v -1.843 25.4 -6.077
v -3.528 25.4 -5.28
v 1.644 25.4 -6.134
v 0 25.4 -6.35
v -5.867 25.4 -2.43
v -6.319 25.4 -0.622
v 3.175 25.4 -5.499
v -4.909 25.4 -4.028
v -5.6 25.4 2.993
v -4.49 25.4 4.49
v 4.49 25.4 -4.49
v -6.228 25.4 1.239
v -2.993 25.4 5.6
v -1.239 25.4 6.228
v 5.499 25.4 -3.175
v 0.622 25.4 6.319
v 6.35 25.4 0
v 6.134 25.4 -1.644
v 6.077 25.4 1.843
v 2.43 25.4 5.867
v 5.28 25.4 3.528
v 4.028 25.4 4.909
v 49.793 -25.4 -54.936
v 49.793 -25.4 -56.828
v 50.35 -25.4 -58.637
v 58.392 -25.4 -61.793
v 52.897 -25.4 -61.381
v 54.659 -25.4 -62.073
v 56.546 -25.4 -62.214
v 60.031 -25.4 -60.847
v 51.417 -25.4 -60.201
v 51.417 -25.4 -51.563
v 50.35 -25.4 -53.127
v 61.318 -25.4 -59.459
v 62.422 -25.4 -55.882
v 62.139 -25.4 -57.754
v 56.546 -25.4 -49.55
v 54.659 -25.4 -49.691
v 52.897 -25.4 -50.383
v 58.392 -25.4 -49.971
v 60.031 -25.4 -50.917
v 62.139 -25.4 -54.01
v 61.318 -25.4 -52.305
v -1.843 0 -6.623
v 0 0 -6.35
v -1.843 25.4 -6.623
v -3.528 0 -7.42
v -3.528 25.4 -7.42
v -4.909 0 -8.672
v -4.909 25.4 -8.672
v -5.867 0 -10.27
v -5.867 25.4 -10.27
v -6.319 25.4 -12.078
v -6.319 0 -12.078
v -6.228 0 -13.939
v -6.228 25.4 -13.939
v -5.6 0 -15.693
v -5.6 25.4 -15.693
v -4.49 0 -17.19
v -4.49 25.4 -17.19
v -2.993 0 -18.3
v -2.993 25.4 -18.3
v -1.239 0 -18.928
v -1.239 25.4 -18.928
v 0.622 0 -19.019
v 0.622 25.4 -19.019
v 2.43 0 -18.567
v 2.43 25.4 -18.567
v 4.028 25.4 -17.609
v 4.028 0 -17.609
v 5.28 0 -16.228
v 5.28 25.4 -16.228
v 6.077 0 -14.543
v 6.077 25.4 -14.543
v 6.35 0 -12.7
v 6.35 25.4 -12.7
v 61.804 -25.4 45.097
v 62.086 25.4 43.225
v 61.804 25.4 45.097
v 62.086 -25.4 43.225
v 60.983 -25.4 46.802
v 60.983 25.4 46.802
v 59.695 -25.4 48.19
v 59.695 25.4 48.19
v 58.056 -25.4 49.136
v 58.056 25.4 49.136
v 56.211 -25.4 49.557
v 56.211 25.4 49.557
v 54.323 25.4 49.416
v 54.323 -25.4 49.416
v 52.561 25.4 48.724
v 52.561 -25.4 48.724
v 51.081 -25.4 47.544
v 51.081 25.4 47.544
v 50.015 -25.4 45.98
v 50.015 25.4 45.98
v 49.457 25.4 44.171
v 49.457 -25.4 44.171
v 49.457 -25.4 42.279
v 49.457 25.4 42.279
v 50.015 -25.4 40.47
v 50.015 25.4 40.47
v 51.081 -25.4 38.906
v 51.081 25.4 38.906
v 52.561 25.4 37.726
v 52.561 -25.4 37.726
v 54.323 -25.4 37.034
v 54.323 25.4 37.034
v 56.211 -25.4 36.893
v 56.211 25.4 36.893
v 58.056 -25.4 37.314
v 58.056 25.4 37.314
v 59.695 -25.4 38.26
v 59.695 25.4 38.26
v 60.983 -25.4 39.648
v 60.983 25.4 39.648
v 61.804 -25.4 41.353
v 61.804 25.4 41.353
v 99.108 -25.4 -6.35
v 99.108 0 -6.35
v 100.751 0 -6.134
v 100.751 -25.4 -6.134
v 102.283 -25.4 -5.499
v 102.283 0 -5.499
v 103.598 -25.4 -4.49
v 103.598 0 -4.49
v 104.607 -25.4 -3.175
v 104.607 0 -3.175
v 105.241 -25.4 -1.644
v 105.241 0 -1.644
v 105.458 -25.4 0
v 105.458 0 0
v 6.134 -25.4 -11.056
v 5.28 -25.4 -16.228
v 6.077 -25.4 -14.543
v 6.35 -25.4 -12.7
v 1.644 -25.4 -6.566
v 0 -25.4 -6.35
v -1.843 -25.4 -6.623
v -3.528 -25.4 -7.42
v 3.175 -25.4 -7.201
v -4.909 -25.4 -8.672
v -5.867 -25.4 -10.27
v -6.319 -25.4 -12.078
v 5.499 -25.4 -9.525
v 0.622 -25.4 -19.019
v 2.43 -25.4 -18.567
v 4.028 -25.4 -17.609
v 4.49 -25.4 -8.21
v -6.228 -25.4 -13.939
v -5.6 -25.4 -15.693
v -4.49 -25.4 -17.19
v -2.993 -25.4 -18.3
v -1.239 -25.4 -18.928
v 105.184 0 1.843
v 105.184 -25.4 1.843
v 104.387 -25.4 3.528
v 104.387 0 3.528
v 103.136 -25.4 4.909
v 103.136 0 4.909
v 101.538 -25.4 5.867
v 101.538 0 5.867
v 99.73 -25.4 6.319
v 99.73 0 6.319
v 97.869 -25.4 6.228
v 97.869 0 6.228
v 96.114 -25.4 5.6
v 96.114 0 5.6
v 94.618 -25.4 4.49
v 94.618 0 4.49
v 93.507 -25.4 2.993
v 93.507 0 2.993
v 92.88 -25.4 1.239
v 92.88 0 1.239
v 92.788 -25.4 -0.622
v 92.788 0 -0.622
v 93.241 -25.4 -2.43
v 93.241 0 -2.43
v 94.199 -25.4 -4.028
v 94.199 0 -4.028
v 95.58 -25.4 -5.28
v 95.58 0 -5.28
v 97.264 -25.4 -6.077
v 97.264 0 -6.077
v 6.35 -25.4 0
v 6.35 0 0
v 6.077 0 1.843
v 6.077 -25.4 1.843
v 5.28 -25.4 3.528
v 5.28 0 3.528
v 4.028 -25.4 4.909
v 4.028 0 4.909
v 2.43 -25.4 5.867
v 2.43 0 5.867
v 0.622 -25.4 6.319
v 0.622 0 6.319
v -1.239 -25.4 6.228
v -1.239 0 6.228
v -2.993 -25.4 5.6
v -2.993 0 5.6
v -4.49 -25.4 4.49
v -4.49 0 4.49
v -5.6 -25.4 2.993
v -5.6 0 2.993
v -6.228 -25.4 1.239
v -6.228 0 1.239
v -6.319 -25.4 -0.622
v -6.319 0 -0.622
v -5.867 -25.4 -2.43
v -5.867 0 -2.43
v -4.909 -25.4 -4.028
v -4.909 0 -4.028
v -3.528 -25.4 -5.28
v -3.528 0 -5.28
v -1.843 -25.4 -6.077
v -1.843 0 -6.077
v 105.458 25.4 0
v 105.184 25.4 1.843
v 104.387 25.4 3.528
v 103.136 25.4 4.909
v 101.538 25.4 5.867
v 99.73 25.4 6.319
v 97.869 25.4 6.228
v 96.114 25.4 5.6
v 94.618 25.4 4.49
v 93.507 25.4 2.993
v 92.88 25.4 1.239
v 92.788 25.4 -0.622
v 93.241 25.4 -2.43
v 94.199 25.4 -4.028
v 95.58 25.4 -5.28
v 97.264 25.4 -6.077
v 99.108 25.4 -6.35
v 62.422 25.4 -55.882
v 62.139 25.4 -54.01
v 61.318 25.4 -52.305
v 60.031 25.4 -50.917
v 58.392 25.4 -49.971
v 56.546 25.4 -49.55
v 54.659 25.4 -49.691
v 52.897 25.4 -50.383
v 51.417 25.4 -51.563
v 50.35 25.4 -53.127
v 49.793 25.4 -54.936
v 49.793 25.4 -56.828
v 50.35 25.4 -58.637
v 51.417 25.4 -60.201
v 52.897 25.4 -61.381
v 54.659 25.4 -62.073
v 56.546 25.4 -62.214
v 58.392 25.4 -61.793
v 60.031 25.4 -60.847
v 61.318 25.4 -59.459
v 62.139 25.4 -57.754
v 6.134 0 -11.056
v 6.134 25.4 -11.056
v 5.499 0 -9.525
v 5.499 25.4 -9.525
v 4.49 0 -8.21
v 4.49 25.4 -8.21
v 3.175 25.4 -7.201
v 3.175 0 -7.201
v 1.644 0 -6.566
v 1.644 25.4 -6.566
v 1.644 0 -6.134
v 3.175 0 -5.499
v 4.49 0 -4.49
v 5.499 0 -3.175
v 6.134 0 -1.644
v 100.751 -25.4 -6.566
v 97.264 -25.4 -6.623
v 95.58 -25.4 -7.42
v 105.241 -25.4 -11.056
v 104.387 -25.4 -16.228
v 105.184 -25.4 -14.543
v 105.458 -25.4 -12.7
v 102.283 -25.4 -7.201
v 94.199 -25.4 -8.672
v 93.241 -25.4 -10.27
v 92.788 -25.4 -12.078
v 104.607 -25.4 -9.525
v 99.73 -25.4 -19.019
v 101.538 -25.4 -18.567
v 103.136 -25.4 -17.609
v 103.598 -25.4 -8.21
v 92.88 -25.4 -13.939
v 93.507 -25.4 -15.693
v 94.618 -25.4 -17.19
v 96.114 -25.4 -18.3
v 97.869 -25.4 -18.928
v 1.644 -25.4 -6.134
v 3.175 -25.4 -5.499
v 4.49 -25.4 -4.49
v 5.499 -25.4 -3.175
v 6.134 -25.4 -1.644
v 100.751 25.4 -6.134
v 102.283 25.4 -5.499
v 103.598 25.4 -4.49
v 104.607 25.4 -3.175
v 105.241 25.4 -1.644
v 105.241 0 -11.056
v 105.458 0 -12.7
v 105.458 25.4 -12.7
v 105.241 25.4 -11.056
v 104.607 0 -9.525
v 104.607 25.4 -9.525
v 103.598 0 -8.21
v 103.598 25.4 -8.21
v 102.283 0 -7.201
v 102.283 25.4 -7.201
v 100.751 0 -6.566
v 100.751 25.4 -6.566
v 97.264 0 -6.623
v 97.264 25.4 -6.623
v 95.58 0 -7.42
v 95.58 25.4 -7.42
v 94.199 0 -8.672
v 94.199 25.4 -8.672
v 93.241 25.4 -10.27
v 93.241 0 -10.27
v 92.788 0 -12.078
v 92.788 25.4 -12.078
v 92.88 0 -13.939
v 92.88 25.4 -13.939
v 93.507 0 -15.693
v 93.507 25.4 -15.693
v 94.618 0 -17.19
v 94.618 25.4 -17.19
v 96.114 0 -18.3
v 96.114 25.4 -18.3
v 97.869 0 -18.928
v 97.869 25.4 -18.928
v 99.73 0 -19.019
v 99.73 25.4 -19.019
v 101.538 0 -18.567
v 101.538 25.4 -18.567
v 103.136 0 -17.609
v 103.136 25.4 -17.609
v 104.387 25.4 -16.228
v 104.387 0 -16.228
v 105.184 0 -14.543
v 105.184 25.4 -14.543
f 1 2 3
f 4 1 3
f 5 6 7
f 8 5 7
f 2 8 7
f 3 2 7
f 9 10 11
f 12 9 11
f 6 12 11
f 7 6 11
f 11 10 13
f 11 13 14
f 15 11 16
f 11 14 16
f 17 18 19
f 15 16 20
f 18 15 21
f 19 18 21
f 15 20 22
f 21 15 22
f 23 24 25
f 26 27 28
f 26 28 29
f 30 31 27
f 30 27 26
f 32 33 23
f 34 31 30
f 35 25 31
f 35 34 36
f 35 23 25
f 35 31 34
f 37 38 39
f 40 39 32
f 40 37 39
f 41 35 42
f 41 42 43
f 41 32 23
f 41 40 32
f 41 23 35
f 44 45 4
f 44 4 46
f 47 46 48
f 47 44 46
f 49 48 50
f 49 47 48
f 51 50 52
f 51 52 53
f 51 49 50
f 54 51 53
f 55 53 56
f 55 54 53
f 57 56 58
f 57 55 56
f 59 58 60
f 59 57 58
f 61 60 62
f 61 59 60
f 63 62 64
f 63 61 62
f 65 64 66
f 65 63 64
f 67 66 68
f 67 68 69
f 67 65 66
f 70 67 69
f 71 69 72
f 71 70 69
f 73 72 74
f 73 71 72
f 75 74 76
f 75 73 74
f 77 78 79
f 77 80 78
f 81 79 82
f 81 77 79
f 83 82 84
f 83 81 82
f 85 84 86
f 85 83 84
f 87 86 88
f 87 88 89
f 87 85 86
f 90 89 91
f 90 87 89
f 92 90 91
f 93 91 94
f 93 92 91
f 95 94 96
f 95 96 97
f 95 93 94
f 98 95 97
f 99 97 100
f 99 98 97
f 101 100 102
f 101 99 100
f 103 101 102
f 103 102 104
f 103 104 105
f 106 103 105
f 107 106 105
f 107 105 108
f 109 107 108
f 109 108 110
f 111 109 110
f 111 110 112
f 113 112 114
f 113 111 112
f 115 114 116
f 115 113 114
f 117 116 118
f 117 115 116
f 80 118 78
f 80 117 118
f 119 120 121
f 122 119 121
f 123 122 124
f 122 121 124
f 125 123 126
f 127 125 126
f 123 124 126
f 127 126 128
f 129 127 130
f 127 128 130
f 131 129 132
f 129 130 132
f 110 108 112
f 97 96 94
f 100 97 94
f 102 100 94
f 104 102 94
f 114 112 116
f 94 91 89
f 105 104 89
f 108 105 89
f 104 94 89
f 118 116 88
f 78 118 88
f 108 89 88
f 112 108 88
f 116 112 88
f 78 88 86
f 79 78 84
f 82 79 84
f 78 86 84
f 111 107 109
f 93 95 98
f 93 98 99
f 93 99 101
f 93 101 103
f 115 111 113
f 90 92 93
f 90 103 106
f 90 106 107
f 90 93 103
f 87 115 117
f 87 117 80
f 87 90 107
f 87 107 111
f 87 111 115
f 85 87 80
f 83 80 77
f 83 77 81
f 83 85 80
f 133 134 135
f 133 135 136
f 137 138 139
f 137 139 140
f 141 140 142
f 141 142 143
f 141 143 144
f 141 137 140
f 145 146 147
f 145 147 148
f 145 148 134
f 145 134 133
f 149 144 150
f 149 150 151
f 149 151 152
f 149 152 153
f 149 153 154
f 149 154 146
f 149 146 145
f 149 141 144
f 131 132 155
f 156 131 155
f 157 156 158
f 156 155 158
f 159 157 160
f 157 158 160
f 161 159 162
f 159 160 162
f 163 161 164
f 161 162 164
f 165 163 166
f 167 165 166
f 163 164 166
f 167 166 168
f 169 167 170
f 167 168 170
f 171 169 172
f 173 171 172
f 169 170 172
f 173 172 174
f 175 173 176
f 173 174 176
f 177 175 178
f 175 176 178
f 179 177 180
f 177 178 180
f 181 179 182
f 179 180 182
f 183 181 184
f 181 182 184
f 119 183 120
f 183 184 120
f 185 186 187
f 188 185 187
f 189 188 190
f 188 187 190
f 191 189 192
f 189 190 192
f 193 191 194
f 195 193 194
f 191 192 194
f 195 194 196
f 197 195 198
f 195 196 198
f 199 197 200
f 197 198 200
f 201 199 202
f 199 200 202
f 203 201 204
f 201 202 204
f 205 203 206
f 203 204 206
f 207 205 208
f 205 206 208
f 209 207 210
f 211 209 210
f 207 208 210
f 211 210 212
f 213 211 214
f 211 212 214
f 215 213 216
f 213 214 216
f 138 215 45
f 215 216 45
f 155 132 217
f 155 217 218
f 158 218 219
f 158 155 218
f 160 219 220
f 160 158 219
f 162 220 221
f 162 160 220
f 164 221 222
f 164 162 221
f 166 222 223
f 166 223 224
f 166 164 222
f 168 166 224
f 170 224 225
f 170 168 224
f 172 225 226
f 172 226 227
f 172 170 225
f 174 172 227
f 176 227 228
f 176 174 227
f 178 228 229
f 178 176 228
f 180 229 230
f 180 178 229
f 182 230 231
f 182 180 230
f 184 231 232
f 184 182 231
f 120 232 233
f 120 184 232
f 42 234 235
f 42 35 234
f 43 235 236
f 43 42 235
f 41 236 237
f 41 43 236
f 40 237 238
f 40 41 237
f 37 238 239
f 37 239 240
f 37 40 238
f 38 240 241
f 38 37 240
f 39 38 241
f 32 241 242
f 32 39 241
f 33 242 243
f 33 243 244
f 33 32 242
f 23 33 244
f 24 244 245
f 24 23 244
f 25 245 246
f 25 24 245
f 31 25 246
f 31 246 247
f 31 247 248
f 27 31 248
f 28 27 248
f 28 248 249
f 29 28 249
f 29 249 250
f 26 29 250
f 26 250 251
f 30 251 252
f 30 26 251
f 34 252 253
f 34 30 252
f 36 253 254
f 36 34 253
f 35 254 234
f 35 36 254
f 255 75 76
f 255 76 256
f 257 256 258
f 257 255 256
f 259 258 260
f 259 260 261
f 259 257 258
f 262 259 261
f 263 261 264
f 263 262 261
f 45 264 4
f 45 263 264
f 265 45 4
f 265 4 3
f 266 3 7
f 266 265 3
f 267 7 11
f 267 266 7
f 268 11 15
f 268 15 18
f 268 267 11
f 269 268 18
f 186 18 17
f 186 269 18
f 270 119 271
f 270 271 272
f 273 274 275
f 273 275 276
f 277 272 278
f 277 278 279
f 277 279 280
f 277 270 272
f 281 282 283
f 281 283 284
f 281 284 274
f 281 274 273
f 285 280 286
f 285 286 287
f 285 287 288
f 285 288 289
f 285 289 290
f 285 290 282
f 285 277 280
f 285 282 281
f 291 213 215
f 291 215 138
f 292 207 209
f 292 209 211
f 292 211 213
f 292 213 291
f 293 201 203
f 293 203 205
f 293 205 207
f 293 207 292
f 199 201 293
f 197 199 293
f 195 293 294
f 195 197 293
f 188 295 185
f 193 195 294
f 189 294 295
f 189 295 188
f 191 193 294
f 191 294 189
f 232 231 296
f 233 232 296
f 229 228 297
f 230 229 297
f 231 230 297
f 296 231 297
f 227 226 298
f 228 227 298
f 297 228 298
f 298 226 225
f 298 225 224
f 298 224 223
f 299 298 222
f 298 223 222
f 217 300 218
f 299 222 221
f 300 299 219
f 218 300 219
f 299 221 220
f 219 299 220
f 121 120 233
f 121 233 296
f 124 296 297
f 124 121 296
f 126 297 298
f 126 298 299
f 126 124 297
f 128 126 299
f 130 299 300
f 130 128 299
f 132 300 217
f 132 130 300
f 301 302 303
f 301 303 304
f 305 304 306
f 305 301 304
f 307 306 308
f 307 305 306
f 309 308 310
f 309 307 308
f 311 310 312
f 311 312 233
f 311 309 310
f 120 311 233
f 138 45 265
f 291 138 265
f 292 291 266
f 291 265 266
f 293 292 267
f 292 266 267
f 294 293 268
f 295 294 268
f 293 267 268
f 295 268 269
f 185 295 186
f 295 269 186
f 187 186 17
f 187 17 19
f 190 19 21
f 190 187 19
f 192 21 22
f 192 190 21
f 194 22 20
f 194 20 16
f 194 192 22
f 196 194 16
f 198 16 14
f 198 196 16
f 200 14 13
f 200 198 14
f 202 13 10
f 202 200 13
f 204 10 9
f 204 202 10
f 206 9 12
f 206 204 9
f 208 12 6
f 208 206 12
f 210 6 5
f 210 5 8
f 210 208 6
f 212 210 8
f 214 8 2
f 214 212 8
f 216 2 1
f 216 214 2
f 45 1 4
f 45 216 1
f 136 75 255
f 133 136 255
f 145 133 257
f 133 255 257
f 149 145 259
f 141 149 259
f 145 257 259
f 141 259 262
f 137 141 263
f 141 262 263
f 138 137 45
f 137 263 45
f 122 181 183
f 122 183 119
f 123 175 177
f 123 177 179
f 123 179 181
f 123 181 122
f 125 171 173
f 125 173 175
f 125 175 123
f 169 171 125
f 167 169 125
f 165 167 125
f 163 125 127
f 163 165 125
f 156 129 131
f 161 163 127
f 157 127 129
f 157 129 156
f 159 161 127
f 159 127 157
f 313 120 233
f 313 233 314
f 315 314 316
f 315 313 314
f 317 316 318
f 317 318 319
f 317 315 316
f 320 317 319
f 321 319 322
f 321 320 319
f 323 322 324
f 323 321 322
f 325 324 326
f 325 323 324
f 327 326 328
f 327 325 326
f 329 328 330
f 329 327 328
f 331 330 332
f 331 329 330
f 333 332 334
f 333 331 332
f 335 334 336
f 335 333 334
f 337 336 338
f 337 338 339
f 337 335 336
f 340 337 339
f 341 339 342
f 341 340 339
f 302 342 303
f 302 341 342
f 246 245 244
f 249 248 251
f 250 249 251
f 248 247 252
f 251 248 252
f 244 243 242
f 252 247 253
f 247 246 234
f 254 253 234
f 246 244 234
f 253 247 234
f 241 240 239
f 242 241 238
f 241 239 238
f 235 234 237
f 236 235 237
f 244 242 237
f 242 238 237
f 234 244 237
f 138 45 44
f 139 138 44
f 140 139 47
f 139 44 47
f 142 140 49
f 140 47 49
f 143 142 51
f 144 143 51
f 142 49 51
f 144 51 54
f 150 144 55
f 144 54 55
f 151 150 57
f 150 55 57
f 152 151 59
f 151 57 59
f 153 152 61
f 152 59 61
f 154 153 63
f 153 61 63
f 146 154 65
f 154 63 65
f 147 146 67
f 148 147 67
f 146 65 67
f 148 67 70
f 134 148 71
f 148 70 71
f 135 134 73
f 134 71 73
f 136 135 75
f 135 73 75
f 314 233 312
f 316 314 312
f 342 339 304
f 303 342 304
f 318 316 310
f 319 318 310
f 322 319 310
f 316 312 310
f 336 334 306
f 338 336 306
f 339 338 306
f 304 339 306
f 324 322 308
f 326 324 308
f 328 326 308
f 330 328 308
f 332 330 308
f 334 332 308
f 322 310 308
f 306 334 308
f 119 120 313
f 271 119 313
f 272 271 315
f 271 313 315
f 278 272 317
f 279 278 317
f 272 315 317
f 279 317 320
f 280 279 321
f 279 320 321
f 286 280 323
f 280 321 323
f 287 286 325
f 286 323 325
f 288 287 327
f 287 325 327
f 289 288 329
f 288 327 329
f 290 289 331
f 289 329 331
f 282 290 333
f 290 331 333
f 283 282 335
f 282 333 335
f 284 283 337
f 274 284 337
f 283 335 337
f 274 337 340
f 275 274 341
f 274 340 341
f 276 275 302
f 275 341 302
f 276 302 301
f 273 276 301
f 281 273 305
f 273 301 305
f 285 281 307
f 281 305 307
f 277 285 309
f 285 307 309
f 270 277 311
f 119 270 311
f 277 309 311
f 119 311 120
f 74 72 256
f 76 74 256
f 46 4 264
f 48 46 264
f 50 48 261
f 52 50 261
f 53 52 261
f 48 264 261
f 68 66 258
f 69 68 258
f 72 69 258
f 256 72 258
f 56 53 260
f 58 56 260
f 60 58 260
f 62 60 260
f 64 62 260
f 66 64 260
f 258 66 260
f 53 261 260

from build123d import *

# Parameters (mm, degrees)
F1_DEPTH = 25.4
F0_R     = 6.35


with BuildPart() as f1:
    # F0 (on Front) → F1 (new body, symmetric)
    with BuildSketch(Plane.XZ):
        with BuildLine():
            ThreePointArc((0, -6.35), (4.4901280605, -4.4901280605), (6.35, 0))
            ThreePointArc((6.35, 0), (-4.4901280605, 4.4901280605), (0, -6.35))
        make_face()
    extrude(amount=F1_DEPTH, both=True)


with BuildPart() as f1b:
    # F0 (on Front) → F1, piece 2 (new body, symmetric)
    with BuildSketch(Plane.XZ):
        with BuildLine():
            ThreePointArc((6.35, -12.7), (4.4901280605, -8.2098719395), (0, -6.35))
            ThreePointArc((0, -6.35), (-4.4901280605, -17.1901280605), (6.35, -12.7))
        make_face()
    extrude(amount=F1_DEPTH, both=True)


with BuildPart() as f1c:
    # F0 (on Front) → F1, piece 3 (new body, symmetric)
    with BuildSketch(Plane.XZ):
        with Locations((56.0715944443, -55.8820392913)):
            Circle(F0_R)
    extrude(amount=F1_DEPTH, both=True)


with BuildPart() as f1d:
    # F0 (on Front) → F1, piece 4 (new body, symmetric)
    with BuildSketch(Plane.XZ):
        with BuildLine():
            ThreePointArc((99.1076529026, -6.35), (94.6175248421, -17.1901280605), (105.4576529026, -12.7))
            ThreePointArc((105.4576529026, -12.7), (103.5977809631, -8.2098719395), (99.1076529026, -6.35))
        make_face()
    extrude(amount=F1_DEPTH, both=True)


with BuildPart() as f1e:
    # F0 (on Front) → F1, piece 5 (new body, symmetric)
    with BuildSketch(Plane.XZ):
        with BuildLine():
            ThreePointArc((105.4576529026, 0), (94.6175248421, 4.4901280605), (99.1076529026, -6.35))
            ThreePointArc((99.1076529026, -6.35), (103.5977809631, -4.4901280605), (105.4576529026, 0))
        make_face()
    extrude(amount=F1_DEPTH, both=True)


with BuildPart() as f1f:
    # F0 (on Front) → F1, piece 6 (new body, symmetric)
    with BuildSketch(Plane.XZ):
        with Locations((55.7359856422, 43.2250453727)):
            Circle(F0_R)
    extrude(amount=F1_DEPTH, both=True)


solid = Compound([f1.part, f1b.part, f1c.part, f1d.part, f1e.part, f1f.part])
